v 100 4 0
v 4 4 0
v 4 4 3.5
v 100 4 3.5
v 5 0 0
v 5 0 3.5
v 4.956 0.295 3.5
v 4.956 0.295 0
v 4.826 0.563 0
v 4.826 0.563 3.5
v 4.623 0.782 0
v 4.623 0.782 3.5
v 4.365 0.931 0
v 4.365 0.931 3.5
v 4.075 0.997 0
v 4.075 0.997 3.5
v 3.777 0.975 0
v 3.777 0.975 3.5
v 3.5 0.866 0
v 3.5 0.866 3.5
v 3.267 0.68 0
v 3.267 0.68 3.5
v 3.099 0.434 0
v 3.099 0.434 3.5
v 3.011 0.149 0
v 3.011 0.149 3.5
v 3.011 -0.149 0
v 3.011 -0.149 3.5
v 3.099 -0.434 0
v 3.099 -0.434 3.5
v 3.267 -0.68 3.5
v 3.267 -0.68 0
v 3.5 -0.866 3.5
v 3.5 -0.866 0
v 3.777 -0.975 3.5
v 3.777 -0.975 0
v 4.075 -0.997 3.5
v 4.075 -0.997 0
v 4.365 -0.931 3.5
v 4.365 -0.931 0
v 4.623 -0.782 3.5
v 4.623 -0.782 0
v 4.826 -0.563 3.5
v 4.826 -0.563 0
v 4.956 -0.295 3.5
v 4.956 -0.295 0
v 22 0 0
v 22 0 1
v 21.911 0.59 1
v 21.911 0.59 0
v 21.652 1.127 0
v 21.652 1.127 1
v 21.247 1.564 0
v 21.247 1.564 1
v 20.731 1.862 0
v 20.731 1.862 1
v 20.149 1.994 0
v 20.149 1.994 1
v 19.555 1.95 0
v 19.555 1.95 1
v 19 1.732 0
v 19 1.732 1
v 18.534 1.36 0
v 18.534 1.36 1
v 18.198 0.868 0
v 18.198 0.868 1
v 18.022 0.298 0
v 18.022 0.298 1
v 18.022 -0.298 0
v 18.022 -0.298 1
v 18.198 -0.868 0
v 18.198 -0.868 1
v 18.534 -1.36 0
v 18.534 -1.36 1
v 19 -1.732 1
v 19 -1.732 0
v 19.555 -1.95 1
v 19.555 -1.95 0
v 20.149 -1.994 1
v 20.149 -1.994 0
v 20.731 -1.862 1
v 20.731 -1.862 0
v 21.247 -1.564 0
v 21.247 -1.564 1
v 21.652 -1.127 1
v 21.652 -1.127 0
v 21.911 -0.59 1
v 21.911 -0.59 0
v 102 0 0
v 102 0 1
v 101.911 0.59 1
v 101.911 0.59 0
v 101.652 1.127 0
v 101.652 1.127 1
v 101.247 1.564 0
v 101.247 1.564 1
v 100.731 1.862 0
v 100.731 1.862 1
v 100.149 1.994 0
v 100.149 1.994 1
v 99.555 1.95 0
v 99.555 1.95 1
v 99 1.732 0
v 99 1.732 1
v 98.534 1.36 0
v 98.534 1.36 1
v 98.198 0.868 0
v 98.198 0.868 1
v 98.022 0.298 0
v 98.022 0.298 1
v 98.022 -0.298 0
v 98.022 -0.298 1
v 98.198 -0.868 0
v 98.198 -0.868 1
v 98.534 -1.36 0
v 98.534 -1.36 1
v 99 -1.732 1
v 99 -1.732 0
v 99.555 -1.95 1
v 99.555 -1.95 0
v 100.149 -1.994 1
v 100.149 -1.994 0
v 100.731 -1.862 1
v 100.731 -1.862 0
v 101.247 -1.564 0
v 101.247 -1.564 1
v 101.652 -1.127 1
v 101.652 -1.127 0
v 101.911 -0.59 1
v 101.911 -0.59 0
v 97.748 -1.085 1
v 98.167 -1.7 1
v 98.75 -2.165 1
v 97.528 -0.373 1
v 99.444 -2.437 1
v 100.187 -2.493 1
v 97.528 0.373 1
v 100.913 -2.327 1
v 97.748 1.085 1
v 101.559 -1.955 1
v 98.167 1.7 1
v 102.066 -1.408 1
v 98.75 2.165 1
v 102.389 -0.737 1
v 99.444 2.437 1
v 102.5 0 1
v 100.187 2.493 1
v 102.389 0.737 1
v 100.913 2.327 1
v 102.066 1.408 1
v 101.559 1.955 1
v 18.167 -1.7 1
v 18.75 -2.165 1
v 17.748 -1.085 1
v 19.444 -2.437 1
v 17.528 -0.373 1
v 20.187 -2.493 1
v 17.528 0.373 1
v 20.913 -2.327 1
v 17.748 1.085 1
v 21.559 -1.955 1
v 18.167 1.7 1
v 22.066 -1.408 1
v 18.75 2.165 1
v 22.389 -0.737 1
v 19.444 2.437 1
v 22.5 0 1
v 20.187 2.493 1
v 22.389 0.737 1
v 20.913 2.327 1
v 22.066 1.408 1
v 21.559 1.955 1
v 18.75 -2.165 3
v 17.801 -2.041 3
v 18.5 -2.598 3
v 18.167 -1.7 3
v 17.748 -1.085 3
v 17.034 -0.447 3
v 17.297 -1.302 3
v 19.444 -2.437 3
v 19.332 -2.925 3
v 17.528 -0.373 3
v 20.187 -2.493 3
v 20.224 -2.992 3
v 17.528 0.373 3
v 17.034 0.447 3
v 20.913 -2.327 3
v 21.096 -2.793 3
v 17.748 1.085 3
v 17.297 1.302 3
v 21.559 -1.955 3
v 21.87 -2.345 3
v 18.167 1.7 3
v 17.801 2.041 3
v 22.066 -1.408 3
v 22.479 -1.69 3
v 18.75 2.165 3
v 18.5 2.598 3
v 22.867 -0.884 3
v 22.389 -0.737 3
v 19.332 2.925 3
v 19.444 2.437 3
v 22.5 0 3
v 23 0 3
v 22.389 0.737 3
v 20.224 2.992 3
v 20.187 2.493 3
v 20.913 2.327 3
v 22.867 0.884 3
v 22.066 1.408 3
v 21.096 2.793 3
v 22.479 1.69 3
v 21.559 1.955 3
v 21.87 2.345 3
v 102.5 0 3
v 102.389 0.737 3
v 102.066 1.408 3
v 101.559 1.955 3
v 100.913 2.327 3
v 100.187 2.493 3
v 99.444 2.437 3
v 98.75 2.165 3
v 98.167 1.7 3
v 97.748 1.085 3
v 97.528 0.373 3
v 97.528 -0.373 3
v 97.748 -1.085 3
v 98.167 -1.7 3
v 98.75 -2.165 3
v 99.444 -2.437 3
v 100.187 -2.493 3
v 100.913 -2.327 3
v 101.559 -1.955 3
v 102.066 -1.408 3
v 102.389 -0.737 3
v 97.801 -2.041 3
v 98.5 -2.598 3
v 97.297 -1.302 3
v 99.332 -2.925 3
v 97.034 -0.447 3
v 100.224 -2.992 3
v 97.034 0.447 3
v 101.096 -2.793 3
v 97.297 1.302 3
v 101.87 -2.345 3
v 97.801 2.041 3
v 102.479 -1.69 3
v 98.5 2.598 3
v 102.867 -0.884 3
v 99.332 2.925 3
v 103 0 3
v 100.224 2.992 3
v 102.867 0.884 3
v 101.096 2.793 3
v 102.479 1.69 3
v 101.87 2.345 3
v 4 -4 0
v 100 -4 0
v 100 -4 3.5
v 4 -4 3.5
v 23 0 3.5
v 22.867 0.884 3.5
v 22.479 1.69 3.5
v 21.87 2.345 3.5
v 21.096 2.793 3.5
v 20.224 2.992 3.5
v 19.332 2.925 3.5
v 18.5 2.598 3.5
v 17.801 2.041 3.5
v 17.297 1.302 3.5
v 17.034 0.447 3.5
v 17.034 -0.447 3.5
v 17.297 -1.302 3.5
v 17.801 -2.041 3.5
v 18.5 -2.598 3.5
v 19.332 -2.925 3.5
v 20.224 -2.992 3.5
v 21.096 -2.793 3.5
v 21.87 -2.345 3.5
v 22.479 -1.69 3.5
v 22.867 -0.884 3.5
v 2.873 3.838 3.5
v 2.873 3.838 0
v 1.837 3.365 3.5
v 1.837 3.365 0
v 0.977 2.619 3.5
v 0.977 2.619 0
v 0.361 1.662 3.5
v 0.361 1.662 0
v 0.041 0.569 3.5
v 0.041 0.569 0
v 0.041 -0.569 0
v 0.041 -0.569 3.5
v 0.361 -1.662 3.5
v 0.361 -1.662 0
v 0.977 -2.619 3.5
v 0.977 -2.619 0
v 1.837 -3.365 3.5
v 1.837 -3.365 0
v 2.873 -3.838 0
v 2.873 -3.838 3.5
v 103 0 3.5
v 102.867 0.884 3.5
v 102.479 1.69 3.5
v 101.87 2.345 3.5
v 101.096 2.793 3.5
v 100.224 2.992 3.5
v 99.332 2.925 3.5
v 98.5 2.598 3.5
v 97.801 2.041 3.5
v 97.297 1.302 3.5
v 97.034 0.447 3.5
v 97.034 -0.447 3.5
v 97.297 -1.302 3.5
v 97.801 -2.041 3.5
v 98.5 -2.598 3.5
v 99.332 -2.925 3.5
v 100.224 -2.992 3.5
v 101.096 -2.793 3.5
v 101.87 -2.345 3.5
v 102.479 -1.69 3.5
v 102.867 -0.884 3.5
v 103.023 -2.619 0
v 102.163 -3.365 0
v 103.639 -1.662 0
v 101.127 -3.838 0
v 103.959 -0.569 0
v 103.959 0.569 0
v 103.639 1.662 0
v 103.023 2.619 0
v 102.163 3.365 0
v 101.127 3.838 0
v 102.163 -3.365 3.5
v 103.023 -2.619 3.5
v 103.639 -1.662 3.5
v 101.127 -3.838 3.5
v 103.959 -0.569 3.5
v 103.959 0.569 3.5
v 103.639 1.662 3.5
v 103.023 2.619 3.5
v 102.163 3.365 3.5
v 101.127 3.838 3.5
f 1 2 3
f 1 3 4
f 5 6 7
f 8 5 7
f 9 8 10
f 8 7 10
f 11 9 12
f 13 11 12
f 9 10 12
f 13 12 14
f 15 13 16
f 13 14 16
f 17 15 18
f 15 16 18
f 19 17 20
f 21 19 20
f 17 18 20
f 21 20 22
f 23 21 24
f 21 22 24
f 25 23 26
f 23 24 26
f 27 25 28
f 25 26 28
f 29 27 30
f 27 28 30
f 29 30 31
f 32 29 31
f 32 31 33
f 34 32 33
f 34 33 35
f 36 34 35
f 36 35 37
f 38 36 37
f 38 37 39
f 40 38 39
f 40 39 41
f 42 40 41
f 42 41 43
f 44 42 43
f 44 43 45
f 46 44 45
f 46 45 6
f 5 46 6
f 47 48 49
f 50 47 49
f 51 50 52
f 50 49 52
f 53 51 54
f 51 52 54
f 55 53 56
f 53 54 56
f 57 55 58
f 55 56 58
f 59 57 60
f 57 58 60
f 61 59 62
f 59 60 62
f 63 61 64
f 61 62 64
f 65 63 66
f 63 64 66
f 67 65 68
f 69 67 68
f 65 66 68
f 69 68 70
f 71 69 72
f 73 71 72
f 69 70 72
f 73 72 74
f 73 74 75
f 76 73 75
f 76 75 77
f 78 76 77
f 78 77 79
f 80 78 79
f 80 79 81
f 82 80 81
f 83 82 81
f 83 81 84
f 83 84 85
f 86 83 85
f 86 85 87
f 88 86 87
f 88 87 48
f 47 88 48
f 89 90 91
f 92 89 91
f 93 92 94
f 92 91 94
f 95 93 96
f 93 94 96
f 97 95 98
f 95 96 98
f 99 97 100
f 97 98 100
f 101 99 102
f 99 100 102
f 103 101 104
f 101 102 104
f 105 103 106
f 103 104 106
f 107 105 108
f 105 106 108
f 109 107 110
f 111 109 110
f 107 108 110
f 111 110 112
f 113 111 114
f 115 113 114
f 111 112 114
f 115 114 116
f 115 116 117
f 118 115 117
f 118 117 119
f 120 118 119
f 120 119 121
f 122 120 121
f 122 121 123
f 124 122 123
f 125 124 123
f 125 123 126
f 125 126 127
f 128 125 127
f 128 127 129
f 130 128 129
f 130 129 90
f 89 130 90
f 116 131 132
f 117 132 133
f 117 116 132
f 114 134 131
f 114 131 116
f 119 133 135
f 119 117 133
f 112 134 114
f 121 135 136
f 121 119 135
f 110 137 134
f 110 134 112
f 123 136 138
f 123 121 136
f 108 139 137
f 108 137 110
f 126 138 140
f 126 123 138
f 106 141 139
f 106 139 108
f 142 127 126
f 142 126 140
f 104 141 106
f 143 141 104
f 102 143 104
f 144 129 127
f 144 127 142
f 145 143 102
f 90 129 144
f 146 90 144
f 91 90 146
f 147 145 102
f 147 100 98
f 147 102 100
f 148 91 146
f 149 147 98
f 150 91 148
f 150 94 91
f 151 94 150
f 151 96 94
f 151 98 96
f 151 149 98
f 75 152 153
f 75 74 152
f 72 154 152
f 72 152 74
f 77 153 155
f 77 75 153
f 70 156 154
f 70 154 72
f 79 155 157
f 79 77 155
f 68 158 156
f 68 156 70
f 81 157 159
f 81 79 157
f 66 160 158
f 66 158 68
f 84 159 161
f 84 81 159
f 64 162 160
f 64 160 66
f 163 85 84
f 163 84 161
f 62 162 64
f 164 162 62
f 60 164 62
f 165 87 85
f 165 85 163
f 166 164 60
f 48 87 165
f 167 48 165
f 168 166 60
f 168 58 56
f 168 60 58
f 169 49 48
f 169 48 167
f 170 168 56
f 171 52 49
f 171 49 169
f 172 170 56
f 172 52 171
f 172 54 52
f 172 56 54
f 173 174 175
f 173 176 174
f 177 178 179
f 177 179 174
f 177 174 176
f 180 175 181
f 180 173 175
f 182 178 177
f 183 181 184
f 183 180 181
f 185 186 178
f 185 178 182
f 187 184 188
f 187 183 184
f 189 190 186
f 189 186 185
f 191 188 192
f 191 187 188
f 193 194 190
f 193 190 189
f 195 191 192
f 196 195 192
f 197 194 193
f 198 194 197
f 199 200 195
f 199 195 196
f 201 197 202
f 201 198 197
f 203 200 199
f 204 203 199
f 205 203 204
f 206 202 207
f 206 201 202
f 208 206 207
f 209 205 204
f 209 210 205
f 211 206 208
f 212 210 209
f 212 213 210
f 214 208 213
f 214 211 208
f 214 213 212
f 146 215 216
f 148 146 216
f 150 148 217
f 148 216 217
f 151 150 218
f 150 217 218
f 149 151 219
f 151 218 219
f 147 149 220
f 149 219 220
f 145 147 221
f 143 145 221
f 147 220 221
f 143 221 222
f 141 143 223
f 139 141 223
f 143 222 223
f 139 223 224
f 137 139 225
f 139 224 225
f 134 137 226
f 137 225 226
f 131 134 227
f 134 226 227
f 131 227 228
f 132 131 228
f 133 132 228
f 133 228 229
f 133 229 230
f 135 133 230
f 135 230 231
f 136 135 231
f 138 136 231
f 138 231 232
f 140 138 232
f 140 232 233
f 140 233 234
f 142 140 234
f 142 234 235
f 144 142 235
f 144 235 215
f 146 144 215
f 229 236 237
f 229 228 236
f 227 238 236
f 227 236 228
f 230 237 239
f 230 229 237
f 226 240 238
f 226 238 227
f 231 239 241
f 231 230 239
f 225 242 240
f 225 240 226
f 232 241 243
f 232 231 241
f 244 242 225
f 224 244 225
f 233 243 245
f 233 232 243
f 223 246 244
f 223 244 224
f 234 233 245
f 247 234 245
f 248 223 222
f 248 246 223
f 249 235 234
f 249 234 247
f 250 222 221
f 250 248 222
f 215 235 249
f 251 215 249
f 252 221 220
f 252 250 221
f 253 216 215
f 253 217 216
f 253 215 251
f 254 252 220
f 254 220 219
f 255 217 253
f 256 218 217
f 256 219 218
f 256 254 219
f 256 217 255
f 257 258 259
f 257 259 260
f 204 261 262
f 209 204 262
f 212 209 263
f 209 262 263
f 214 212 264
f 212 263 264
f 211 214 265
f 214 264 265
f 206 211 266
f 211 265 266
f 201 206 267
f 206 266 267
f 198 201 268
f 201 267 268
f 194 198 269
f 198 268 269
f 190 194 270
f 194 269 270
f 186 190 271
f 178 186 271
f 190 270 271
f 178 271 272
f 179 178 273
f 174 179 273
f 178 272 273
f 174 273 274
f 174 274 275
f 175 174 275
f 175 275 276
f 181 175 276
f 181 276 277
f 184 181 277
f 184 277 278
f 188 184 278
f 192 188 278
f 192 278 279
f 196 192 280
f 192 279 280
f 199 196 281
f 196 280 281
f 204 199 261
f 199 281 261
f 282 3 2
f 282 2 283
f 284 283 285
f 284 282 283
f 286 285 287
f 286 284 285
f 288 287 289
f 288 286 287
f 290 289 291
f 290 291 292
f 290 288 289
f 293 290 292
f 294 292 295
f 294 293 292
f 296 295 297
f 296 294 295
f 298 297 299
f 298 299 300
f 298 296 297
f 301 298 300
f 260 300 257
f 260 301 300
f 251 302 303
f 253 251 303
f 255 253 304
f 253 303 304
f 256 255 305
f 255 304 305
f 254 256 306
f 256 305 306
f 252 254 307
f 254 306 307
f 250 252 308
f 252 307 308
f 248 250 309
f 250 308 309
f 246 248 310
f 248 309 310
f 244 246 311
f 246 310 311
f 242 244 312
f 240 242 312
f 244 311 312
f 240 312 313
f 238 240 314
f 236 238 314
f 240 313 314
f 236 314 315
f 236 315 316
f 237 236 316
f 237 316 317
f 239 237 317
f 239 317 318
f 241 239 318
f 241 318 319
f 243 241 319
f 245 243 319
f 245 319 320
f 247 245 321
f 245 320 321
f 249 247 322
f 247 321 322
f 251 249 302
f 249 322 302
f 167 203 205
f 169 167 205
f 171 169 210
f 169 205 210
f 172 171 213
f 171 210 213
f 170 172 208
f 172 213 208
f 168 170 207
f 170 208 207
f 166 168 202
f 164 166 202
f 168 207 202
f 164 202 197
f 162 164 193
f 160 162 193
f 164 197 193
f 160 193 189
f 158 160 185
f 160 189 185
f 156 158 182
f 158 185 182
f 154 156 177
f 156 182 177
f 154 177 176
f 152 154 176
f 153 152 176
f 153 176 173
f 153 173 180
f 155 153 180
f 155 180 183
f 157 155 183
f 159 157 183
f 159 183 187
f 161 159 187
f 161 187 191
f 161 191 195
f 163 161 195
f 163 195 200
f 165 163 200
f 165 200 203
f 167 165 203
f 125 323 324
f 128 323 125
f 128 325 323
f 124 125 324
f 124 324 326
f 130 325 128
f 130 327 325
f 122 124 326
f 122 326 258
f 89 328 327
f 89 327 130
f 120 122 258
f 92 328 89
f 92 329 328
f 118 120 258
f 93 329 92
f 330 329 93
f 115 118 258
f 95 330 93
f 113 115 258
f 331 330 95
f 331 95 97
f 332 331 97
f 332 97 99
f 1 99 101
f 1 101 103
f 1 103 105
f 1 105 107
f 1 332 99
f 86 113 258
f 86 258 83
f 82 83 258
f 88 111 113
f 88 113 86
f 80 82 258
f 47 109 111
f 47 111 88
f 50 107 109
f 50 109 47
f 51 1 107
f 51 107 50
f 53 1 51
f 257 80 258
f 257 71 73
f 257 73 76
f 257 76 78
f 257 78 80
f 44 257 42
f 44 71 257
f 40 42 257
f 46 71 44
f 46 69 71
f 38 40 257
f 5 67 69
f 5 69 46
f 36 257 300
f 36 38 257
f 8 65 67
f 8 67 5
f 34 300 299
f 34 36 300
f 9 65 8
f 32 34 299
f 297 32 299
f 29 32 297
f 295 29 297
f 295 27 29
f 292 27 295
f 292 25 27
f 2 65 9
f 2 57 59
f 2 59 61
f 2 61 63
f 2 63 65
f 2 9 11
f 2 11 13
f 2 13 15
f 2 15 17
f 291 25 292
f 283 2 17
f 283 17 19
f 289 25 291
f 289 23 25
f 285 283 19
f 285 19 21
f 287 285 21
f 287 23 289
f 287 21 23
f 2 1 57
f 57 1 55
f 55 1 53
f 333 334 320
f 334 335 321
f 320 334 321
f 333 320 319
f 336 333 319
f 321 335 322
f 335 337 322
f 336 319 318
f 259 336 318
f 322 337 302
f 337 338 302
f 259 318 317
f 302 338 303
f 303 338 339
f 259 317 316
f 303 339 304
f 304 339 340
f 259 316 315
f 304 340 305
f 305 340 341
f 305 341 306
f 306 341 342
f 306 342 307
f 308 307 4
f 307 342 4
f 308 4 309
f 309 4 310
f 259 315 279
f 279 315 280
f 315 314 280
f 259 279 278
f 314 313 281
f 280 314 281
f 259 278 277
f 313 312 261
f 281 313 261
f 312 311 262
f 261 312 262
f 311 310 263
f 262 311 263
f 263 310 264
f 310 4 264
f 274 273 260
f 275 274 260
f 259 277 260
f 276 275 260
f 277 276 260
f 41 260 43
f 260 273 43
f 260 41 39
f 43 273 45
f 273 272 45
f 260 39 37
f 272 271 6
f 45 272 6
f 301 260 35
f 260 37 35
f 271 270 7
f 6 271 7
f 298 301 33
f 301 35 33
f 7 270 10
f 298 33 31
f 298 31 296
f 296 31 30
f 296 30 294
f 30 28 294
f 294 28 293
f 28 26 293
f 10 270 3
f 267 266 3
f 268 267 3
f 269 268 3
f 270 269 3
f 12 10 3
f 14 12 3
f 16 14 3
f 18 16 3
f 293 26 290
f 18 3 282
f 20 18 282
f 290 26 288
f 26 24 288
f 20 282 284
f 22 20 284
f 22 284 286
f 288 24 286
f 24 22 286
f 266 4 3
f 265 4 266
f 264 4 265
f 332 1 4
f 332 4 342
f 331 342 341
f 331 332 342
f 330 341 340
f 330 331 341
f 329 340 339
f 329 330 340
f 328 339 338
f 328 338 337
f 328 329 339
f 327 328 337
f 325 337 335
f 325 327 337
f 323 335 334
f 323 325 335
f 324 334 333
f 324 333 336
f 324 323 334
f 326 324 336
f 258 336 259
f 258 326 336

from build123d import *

# Parameters (mm, degrees)
EXTRUDE_1_DEPTH     = 3.5
SKETCH_2_R          = 2
CUT_EXTRUDE_1_DEPTH = 105.135728739
SKETCH_2_3_R        = 2.5
SKETCH_2_3_R_2      = 2
CUT_EXTRUDE_2_DEPTH = 2.5
SKETCH_2_4_R        = 3
SKETCH_2_4_R_2      = 2.5
CUT_EXTRUDE_3_DEPTH = 0.5
CUT_EXTRUDE_4_DEPTH = 105.135728739
CUT_EXTRUDE_5_DEPTH = 2.5
CUT_EXTRUDE_6_DEPTH = 0.5
SKETCH_5_R          = 1
CUT_EXTRUDE_8_DEPTH = 105.135728739
CUT_EXTRUDE_9_DEPTH = 105.135728739


with BuildPart() as part:
    # 草图1 → 凸台-拉伸1 (new body)
    with BuildSketch(Plane.XY):
        with BuildLine():
            Line((0, 4), (100, 4))
            ThreePointArc((100, 4), (104, 0), (100, -4))
            Line((100, -4), (0, -4))
            ThreePointArc((0, -4), (-4, 0), (0, 4))
        make_face()
    extrude(amount=EXTRUDE_1_DEPTH)

    # 草图2 → 切除-拉伸1 (cut, through all)
    with BuildSketch(Plane.XY.offset(3.5)):
        with Locations((100, 0)):
            Circle(SKETCH_2_R)
    extrude(amount=-CUT_EXTRUDE_1_DEPTH, mode=Mode.SUBTRACT)

    # 草图2<3> → 切除-拉伸2 (cut)
    with BuildSketch(Plane.XY.offset(3.5)):
        with Locations((100, 0)):
            Circle(SKETCH_2_3_R)
        with Locations((100, 0)):
            Circle(SKETCH_2_3_R_2, mode=Mode.SUBTRACT)
    extrude(amount=-CUT_EXTRUDE_2_DEPTH, mode=Mode.SUBTRACT)

    # 草图2<4> → 切除-拉伸3 (cut)
    with BuildSketch(Plane.XY.offset(3.5)):
        with Locations((100, 0)):
            Circle(SKETCH_2_4_R)
        with Locations((100, 0)):
            Circle(SKETCH_2_4_R_2, mode=Mode.SUBTRACT)
    extrude(amount=-CUT_EXTRUDE_3_DEPTH, mode=Mode.SUBTRACT)

    # 草图3 → 切除-拉伸4 (cut, through all)
    with BuildSketch(Plane.XY.offset(3.5)):
        with BuildLine():
            ThreePointArc((22, 0), (20, 2), (18, 0))
            ThreePointArc((18, 0), (20, -2), (22, 0))
        make_face()
    extrude(amount=-CUT_EXTRUDE_4_DEPTH, mode=Mode.SUBTRACT)

    # 草图3<3> → 切除-拉伸5 (cut)
    with BuildSketch(Plane.XY.offset(3.5)):
        with BuildLine():
            ThreePointArc((22.5, 0), (20, 2.5), (17.5, 0))
            ThreePointArc((17.5, 0), (20, -2.5), (22.5, 0))
        make_face()
        with BuildLine():
            ThreePointArc((22, 0), (20, -2), (18, 0))
            ThreePointArc((18, 0), (20, 2), (22, 0))
        make_face(mode=Mode.SUBTRACT)
    extrude(amount=-CUT_EXTRUDE_5_DEPTH, mode=Mode.SUBTRACT)

    # 草图3<4> → 切除-拉伸6 (cut)
    with BuildSketch(Plane.XY.offset(3.5)):
        with BuildLine():
            ThreePointArc((23, 0), (20, 3), (17, 0))
            ThreePointArc((17, 0), (20, -3), (23, 0))
        make_face()
        with BuildLine():
            ThreePointArc((22.5, 0), (20, -2.5), (17.5, 0))
            ThreePointArc((17.5, 0), (20, 2.5), (22.5, 0))
        make_face(mode=Mode.SUBTRACT)
    extrude(amount=-CUT_EXTRUDE_6_DEPTH, mode=Mode.SUBTRACT)

    # 草图5 → 切除-拉伸8 (cut, through all)
    with BuildSketch(Plane.XY.offset(3.5)):
        with Locations((4, 0)):
            Circle(SKETCH_5_R)
    extrude(amount=-CUT_EXTRUDE_8_DEPTH, mode=Mode.SUBTRACT)

    # 草图6 → 切除-拉伸9 (cut, through all)
    with BuildSketch(Plane.XY.offset(3.5)):
        with BuildLine():
            Line((0, 4), (4, 4))
            ThreePointArc((4, 4), (0, 0), (4, -4))
            Line((4, -4), (0, -4))
            ThreePointArc((0, -4), (-4, 0), (0, 4))
        make_face()
    extrude(amount=-CUT_EXTRUDE_9_DEPTH, mode=Mode.SUBTRACT)


solid = part.part
